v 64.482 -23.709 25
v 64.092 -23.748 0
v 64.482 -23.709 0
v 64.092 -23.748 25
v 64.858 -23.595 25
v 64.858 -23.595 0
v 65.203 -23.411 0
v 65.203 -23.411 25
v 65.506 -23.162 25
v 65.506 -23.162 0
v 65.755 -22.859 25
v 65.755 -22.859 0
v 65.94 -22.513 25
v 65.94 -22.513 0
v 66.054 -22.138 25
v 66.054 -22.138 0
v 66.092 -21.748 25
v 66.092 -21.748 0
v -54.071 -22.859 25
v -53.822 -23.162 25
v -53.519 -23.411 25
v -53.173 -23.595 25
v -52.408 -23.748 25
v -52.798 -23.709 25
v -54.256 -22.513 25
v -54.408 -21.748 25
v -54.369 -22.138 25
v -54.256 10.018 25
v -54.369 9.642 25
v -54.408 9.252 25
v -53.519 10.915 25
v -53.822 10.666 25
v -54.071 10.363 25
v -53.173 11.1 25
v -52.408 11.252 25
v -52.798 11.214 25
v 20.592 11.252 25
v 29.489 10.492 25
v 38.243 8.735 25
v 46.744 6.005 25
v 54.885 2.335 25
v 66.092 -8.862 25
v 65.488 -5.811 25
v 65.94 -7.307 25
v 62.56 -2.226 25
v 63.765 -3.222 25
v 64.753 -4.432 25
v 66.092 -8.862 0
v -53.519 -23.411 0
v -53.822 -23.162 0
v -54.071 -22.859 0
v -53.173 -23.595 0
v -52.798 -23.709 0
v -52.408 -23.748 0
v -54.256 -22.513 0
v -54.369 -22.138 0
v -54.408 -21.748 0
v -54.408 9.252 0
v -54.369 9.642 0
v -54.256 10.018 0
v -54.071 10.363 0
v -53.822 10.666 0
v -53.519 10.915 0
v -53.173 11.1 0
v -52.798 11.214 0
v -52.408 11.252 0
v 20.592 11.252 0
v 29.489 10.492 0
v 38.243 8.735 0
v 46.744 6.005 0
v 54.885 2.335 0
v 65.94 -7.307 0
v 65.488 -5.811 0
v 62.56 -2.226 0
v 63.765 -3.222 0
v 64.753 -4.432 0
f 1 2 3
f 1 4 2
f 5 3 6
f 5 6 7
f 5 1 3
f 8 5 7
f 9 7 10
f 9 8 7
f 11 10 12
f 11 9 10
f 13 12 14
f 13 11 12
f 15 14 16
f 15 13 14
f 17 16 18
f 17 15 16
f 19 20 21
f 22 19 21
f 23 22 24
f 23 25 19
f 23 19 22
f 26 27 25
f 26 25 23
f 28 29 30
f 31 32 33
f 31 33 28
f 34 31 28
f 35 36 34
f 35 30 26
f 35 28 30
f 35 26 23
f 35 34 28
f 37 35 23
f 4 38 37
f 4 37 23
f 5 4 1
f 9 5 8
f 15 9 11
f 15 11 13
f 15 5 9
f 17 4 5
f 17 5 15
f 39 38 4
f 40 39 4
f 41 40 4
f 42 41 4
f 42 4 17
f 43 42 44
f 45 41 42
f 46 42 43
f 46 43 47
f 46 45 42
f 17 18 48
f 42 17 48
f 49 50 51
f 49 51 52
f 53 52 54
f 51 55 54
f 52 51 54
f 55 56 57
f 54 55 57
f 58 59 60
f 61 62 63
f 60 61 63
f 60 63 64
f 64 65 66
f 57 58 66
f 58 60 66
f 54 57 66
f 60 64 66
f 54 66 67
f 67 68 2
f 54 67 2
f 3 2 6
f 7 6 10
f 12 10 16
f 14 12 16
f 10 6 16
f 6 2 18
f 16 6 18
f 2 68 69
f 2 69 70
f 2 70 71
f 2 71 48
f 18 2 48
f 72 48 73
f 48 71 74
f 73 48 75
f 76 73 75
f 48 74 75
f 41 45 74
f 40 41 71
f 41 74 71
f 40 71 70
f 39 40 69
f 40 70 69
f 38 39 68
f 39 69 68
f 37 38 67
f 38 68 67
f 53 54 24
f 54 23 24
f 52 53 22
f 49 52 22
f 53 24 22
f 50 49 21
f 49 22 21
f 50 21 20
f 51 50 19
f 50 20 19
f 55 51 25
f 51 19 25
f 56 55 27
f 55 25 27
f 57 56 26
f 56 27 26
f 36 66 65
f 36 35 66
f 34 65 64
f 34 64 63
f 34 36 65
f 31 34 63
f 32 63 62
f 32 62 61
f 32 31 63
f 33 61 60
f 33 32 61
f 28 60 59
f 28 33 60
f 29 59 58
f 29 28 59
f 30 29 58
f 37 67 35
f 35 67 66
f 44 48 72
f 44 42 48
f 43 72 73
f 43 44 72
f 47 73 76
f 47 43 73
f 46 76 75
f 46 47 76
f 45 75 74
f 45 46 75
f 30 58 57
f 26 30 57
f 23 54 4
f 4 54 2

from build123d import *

# Parameters (mm, degrees)
F1_DEPTH = 25
F2_R     = 2
F3_R     = 8


with BuildPart() as f1:
    # F0 (on Top) → F1 (new body)
    with BuildSketch(Plane.XY):
        with BuildLine():
            Line((-54.407789, -23.747728), (66.092211, -23.747728))
            Line((66.092211, -23.747728), (66.092211, -4.747728))
            ThreePointArc((66.092211, -4.747728), (44.589047, 6.797961), (20.592211, 11.252272))
            Line((20.592211, 11.252272), (-54.407789, 11.252272))
            Line((-54.407789, 11.252272), (-54.407789, -23.747728))
        make_face()
    extrude(amount=F1_DEPTH)

    # F2
    f2_edges = [f1.edges().sort_by_distance(p)[0] for p in [
        (-54.407789, -23.747728, 12.5),
        (66.092211, -23.747728, 12.5),
        (-54.407789, 11.252272, 12.5),
    ]]
    fillet(f2_edges, radius=F2_R)

    # F3
    f3_edges = [f1.edges().sort_by_distance(p)[0] for p in [
        (66.092211, -4.747728, 12.5),
    ]]
    fillet(f3_edges, radius=F3_R)


solid = f1.part
